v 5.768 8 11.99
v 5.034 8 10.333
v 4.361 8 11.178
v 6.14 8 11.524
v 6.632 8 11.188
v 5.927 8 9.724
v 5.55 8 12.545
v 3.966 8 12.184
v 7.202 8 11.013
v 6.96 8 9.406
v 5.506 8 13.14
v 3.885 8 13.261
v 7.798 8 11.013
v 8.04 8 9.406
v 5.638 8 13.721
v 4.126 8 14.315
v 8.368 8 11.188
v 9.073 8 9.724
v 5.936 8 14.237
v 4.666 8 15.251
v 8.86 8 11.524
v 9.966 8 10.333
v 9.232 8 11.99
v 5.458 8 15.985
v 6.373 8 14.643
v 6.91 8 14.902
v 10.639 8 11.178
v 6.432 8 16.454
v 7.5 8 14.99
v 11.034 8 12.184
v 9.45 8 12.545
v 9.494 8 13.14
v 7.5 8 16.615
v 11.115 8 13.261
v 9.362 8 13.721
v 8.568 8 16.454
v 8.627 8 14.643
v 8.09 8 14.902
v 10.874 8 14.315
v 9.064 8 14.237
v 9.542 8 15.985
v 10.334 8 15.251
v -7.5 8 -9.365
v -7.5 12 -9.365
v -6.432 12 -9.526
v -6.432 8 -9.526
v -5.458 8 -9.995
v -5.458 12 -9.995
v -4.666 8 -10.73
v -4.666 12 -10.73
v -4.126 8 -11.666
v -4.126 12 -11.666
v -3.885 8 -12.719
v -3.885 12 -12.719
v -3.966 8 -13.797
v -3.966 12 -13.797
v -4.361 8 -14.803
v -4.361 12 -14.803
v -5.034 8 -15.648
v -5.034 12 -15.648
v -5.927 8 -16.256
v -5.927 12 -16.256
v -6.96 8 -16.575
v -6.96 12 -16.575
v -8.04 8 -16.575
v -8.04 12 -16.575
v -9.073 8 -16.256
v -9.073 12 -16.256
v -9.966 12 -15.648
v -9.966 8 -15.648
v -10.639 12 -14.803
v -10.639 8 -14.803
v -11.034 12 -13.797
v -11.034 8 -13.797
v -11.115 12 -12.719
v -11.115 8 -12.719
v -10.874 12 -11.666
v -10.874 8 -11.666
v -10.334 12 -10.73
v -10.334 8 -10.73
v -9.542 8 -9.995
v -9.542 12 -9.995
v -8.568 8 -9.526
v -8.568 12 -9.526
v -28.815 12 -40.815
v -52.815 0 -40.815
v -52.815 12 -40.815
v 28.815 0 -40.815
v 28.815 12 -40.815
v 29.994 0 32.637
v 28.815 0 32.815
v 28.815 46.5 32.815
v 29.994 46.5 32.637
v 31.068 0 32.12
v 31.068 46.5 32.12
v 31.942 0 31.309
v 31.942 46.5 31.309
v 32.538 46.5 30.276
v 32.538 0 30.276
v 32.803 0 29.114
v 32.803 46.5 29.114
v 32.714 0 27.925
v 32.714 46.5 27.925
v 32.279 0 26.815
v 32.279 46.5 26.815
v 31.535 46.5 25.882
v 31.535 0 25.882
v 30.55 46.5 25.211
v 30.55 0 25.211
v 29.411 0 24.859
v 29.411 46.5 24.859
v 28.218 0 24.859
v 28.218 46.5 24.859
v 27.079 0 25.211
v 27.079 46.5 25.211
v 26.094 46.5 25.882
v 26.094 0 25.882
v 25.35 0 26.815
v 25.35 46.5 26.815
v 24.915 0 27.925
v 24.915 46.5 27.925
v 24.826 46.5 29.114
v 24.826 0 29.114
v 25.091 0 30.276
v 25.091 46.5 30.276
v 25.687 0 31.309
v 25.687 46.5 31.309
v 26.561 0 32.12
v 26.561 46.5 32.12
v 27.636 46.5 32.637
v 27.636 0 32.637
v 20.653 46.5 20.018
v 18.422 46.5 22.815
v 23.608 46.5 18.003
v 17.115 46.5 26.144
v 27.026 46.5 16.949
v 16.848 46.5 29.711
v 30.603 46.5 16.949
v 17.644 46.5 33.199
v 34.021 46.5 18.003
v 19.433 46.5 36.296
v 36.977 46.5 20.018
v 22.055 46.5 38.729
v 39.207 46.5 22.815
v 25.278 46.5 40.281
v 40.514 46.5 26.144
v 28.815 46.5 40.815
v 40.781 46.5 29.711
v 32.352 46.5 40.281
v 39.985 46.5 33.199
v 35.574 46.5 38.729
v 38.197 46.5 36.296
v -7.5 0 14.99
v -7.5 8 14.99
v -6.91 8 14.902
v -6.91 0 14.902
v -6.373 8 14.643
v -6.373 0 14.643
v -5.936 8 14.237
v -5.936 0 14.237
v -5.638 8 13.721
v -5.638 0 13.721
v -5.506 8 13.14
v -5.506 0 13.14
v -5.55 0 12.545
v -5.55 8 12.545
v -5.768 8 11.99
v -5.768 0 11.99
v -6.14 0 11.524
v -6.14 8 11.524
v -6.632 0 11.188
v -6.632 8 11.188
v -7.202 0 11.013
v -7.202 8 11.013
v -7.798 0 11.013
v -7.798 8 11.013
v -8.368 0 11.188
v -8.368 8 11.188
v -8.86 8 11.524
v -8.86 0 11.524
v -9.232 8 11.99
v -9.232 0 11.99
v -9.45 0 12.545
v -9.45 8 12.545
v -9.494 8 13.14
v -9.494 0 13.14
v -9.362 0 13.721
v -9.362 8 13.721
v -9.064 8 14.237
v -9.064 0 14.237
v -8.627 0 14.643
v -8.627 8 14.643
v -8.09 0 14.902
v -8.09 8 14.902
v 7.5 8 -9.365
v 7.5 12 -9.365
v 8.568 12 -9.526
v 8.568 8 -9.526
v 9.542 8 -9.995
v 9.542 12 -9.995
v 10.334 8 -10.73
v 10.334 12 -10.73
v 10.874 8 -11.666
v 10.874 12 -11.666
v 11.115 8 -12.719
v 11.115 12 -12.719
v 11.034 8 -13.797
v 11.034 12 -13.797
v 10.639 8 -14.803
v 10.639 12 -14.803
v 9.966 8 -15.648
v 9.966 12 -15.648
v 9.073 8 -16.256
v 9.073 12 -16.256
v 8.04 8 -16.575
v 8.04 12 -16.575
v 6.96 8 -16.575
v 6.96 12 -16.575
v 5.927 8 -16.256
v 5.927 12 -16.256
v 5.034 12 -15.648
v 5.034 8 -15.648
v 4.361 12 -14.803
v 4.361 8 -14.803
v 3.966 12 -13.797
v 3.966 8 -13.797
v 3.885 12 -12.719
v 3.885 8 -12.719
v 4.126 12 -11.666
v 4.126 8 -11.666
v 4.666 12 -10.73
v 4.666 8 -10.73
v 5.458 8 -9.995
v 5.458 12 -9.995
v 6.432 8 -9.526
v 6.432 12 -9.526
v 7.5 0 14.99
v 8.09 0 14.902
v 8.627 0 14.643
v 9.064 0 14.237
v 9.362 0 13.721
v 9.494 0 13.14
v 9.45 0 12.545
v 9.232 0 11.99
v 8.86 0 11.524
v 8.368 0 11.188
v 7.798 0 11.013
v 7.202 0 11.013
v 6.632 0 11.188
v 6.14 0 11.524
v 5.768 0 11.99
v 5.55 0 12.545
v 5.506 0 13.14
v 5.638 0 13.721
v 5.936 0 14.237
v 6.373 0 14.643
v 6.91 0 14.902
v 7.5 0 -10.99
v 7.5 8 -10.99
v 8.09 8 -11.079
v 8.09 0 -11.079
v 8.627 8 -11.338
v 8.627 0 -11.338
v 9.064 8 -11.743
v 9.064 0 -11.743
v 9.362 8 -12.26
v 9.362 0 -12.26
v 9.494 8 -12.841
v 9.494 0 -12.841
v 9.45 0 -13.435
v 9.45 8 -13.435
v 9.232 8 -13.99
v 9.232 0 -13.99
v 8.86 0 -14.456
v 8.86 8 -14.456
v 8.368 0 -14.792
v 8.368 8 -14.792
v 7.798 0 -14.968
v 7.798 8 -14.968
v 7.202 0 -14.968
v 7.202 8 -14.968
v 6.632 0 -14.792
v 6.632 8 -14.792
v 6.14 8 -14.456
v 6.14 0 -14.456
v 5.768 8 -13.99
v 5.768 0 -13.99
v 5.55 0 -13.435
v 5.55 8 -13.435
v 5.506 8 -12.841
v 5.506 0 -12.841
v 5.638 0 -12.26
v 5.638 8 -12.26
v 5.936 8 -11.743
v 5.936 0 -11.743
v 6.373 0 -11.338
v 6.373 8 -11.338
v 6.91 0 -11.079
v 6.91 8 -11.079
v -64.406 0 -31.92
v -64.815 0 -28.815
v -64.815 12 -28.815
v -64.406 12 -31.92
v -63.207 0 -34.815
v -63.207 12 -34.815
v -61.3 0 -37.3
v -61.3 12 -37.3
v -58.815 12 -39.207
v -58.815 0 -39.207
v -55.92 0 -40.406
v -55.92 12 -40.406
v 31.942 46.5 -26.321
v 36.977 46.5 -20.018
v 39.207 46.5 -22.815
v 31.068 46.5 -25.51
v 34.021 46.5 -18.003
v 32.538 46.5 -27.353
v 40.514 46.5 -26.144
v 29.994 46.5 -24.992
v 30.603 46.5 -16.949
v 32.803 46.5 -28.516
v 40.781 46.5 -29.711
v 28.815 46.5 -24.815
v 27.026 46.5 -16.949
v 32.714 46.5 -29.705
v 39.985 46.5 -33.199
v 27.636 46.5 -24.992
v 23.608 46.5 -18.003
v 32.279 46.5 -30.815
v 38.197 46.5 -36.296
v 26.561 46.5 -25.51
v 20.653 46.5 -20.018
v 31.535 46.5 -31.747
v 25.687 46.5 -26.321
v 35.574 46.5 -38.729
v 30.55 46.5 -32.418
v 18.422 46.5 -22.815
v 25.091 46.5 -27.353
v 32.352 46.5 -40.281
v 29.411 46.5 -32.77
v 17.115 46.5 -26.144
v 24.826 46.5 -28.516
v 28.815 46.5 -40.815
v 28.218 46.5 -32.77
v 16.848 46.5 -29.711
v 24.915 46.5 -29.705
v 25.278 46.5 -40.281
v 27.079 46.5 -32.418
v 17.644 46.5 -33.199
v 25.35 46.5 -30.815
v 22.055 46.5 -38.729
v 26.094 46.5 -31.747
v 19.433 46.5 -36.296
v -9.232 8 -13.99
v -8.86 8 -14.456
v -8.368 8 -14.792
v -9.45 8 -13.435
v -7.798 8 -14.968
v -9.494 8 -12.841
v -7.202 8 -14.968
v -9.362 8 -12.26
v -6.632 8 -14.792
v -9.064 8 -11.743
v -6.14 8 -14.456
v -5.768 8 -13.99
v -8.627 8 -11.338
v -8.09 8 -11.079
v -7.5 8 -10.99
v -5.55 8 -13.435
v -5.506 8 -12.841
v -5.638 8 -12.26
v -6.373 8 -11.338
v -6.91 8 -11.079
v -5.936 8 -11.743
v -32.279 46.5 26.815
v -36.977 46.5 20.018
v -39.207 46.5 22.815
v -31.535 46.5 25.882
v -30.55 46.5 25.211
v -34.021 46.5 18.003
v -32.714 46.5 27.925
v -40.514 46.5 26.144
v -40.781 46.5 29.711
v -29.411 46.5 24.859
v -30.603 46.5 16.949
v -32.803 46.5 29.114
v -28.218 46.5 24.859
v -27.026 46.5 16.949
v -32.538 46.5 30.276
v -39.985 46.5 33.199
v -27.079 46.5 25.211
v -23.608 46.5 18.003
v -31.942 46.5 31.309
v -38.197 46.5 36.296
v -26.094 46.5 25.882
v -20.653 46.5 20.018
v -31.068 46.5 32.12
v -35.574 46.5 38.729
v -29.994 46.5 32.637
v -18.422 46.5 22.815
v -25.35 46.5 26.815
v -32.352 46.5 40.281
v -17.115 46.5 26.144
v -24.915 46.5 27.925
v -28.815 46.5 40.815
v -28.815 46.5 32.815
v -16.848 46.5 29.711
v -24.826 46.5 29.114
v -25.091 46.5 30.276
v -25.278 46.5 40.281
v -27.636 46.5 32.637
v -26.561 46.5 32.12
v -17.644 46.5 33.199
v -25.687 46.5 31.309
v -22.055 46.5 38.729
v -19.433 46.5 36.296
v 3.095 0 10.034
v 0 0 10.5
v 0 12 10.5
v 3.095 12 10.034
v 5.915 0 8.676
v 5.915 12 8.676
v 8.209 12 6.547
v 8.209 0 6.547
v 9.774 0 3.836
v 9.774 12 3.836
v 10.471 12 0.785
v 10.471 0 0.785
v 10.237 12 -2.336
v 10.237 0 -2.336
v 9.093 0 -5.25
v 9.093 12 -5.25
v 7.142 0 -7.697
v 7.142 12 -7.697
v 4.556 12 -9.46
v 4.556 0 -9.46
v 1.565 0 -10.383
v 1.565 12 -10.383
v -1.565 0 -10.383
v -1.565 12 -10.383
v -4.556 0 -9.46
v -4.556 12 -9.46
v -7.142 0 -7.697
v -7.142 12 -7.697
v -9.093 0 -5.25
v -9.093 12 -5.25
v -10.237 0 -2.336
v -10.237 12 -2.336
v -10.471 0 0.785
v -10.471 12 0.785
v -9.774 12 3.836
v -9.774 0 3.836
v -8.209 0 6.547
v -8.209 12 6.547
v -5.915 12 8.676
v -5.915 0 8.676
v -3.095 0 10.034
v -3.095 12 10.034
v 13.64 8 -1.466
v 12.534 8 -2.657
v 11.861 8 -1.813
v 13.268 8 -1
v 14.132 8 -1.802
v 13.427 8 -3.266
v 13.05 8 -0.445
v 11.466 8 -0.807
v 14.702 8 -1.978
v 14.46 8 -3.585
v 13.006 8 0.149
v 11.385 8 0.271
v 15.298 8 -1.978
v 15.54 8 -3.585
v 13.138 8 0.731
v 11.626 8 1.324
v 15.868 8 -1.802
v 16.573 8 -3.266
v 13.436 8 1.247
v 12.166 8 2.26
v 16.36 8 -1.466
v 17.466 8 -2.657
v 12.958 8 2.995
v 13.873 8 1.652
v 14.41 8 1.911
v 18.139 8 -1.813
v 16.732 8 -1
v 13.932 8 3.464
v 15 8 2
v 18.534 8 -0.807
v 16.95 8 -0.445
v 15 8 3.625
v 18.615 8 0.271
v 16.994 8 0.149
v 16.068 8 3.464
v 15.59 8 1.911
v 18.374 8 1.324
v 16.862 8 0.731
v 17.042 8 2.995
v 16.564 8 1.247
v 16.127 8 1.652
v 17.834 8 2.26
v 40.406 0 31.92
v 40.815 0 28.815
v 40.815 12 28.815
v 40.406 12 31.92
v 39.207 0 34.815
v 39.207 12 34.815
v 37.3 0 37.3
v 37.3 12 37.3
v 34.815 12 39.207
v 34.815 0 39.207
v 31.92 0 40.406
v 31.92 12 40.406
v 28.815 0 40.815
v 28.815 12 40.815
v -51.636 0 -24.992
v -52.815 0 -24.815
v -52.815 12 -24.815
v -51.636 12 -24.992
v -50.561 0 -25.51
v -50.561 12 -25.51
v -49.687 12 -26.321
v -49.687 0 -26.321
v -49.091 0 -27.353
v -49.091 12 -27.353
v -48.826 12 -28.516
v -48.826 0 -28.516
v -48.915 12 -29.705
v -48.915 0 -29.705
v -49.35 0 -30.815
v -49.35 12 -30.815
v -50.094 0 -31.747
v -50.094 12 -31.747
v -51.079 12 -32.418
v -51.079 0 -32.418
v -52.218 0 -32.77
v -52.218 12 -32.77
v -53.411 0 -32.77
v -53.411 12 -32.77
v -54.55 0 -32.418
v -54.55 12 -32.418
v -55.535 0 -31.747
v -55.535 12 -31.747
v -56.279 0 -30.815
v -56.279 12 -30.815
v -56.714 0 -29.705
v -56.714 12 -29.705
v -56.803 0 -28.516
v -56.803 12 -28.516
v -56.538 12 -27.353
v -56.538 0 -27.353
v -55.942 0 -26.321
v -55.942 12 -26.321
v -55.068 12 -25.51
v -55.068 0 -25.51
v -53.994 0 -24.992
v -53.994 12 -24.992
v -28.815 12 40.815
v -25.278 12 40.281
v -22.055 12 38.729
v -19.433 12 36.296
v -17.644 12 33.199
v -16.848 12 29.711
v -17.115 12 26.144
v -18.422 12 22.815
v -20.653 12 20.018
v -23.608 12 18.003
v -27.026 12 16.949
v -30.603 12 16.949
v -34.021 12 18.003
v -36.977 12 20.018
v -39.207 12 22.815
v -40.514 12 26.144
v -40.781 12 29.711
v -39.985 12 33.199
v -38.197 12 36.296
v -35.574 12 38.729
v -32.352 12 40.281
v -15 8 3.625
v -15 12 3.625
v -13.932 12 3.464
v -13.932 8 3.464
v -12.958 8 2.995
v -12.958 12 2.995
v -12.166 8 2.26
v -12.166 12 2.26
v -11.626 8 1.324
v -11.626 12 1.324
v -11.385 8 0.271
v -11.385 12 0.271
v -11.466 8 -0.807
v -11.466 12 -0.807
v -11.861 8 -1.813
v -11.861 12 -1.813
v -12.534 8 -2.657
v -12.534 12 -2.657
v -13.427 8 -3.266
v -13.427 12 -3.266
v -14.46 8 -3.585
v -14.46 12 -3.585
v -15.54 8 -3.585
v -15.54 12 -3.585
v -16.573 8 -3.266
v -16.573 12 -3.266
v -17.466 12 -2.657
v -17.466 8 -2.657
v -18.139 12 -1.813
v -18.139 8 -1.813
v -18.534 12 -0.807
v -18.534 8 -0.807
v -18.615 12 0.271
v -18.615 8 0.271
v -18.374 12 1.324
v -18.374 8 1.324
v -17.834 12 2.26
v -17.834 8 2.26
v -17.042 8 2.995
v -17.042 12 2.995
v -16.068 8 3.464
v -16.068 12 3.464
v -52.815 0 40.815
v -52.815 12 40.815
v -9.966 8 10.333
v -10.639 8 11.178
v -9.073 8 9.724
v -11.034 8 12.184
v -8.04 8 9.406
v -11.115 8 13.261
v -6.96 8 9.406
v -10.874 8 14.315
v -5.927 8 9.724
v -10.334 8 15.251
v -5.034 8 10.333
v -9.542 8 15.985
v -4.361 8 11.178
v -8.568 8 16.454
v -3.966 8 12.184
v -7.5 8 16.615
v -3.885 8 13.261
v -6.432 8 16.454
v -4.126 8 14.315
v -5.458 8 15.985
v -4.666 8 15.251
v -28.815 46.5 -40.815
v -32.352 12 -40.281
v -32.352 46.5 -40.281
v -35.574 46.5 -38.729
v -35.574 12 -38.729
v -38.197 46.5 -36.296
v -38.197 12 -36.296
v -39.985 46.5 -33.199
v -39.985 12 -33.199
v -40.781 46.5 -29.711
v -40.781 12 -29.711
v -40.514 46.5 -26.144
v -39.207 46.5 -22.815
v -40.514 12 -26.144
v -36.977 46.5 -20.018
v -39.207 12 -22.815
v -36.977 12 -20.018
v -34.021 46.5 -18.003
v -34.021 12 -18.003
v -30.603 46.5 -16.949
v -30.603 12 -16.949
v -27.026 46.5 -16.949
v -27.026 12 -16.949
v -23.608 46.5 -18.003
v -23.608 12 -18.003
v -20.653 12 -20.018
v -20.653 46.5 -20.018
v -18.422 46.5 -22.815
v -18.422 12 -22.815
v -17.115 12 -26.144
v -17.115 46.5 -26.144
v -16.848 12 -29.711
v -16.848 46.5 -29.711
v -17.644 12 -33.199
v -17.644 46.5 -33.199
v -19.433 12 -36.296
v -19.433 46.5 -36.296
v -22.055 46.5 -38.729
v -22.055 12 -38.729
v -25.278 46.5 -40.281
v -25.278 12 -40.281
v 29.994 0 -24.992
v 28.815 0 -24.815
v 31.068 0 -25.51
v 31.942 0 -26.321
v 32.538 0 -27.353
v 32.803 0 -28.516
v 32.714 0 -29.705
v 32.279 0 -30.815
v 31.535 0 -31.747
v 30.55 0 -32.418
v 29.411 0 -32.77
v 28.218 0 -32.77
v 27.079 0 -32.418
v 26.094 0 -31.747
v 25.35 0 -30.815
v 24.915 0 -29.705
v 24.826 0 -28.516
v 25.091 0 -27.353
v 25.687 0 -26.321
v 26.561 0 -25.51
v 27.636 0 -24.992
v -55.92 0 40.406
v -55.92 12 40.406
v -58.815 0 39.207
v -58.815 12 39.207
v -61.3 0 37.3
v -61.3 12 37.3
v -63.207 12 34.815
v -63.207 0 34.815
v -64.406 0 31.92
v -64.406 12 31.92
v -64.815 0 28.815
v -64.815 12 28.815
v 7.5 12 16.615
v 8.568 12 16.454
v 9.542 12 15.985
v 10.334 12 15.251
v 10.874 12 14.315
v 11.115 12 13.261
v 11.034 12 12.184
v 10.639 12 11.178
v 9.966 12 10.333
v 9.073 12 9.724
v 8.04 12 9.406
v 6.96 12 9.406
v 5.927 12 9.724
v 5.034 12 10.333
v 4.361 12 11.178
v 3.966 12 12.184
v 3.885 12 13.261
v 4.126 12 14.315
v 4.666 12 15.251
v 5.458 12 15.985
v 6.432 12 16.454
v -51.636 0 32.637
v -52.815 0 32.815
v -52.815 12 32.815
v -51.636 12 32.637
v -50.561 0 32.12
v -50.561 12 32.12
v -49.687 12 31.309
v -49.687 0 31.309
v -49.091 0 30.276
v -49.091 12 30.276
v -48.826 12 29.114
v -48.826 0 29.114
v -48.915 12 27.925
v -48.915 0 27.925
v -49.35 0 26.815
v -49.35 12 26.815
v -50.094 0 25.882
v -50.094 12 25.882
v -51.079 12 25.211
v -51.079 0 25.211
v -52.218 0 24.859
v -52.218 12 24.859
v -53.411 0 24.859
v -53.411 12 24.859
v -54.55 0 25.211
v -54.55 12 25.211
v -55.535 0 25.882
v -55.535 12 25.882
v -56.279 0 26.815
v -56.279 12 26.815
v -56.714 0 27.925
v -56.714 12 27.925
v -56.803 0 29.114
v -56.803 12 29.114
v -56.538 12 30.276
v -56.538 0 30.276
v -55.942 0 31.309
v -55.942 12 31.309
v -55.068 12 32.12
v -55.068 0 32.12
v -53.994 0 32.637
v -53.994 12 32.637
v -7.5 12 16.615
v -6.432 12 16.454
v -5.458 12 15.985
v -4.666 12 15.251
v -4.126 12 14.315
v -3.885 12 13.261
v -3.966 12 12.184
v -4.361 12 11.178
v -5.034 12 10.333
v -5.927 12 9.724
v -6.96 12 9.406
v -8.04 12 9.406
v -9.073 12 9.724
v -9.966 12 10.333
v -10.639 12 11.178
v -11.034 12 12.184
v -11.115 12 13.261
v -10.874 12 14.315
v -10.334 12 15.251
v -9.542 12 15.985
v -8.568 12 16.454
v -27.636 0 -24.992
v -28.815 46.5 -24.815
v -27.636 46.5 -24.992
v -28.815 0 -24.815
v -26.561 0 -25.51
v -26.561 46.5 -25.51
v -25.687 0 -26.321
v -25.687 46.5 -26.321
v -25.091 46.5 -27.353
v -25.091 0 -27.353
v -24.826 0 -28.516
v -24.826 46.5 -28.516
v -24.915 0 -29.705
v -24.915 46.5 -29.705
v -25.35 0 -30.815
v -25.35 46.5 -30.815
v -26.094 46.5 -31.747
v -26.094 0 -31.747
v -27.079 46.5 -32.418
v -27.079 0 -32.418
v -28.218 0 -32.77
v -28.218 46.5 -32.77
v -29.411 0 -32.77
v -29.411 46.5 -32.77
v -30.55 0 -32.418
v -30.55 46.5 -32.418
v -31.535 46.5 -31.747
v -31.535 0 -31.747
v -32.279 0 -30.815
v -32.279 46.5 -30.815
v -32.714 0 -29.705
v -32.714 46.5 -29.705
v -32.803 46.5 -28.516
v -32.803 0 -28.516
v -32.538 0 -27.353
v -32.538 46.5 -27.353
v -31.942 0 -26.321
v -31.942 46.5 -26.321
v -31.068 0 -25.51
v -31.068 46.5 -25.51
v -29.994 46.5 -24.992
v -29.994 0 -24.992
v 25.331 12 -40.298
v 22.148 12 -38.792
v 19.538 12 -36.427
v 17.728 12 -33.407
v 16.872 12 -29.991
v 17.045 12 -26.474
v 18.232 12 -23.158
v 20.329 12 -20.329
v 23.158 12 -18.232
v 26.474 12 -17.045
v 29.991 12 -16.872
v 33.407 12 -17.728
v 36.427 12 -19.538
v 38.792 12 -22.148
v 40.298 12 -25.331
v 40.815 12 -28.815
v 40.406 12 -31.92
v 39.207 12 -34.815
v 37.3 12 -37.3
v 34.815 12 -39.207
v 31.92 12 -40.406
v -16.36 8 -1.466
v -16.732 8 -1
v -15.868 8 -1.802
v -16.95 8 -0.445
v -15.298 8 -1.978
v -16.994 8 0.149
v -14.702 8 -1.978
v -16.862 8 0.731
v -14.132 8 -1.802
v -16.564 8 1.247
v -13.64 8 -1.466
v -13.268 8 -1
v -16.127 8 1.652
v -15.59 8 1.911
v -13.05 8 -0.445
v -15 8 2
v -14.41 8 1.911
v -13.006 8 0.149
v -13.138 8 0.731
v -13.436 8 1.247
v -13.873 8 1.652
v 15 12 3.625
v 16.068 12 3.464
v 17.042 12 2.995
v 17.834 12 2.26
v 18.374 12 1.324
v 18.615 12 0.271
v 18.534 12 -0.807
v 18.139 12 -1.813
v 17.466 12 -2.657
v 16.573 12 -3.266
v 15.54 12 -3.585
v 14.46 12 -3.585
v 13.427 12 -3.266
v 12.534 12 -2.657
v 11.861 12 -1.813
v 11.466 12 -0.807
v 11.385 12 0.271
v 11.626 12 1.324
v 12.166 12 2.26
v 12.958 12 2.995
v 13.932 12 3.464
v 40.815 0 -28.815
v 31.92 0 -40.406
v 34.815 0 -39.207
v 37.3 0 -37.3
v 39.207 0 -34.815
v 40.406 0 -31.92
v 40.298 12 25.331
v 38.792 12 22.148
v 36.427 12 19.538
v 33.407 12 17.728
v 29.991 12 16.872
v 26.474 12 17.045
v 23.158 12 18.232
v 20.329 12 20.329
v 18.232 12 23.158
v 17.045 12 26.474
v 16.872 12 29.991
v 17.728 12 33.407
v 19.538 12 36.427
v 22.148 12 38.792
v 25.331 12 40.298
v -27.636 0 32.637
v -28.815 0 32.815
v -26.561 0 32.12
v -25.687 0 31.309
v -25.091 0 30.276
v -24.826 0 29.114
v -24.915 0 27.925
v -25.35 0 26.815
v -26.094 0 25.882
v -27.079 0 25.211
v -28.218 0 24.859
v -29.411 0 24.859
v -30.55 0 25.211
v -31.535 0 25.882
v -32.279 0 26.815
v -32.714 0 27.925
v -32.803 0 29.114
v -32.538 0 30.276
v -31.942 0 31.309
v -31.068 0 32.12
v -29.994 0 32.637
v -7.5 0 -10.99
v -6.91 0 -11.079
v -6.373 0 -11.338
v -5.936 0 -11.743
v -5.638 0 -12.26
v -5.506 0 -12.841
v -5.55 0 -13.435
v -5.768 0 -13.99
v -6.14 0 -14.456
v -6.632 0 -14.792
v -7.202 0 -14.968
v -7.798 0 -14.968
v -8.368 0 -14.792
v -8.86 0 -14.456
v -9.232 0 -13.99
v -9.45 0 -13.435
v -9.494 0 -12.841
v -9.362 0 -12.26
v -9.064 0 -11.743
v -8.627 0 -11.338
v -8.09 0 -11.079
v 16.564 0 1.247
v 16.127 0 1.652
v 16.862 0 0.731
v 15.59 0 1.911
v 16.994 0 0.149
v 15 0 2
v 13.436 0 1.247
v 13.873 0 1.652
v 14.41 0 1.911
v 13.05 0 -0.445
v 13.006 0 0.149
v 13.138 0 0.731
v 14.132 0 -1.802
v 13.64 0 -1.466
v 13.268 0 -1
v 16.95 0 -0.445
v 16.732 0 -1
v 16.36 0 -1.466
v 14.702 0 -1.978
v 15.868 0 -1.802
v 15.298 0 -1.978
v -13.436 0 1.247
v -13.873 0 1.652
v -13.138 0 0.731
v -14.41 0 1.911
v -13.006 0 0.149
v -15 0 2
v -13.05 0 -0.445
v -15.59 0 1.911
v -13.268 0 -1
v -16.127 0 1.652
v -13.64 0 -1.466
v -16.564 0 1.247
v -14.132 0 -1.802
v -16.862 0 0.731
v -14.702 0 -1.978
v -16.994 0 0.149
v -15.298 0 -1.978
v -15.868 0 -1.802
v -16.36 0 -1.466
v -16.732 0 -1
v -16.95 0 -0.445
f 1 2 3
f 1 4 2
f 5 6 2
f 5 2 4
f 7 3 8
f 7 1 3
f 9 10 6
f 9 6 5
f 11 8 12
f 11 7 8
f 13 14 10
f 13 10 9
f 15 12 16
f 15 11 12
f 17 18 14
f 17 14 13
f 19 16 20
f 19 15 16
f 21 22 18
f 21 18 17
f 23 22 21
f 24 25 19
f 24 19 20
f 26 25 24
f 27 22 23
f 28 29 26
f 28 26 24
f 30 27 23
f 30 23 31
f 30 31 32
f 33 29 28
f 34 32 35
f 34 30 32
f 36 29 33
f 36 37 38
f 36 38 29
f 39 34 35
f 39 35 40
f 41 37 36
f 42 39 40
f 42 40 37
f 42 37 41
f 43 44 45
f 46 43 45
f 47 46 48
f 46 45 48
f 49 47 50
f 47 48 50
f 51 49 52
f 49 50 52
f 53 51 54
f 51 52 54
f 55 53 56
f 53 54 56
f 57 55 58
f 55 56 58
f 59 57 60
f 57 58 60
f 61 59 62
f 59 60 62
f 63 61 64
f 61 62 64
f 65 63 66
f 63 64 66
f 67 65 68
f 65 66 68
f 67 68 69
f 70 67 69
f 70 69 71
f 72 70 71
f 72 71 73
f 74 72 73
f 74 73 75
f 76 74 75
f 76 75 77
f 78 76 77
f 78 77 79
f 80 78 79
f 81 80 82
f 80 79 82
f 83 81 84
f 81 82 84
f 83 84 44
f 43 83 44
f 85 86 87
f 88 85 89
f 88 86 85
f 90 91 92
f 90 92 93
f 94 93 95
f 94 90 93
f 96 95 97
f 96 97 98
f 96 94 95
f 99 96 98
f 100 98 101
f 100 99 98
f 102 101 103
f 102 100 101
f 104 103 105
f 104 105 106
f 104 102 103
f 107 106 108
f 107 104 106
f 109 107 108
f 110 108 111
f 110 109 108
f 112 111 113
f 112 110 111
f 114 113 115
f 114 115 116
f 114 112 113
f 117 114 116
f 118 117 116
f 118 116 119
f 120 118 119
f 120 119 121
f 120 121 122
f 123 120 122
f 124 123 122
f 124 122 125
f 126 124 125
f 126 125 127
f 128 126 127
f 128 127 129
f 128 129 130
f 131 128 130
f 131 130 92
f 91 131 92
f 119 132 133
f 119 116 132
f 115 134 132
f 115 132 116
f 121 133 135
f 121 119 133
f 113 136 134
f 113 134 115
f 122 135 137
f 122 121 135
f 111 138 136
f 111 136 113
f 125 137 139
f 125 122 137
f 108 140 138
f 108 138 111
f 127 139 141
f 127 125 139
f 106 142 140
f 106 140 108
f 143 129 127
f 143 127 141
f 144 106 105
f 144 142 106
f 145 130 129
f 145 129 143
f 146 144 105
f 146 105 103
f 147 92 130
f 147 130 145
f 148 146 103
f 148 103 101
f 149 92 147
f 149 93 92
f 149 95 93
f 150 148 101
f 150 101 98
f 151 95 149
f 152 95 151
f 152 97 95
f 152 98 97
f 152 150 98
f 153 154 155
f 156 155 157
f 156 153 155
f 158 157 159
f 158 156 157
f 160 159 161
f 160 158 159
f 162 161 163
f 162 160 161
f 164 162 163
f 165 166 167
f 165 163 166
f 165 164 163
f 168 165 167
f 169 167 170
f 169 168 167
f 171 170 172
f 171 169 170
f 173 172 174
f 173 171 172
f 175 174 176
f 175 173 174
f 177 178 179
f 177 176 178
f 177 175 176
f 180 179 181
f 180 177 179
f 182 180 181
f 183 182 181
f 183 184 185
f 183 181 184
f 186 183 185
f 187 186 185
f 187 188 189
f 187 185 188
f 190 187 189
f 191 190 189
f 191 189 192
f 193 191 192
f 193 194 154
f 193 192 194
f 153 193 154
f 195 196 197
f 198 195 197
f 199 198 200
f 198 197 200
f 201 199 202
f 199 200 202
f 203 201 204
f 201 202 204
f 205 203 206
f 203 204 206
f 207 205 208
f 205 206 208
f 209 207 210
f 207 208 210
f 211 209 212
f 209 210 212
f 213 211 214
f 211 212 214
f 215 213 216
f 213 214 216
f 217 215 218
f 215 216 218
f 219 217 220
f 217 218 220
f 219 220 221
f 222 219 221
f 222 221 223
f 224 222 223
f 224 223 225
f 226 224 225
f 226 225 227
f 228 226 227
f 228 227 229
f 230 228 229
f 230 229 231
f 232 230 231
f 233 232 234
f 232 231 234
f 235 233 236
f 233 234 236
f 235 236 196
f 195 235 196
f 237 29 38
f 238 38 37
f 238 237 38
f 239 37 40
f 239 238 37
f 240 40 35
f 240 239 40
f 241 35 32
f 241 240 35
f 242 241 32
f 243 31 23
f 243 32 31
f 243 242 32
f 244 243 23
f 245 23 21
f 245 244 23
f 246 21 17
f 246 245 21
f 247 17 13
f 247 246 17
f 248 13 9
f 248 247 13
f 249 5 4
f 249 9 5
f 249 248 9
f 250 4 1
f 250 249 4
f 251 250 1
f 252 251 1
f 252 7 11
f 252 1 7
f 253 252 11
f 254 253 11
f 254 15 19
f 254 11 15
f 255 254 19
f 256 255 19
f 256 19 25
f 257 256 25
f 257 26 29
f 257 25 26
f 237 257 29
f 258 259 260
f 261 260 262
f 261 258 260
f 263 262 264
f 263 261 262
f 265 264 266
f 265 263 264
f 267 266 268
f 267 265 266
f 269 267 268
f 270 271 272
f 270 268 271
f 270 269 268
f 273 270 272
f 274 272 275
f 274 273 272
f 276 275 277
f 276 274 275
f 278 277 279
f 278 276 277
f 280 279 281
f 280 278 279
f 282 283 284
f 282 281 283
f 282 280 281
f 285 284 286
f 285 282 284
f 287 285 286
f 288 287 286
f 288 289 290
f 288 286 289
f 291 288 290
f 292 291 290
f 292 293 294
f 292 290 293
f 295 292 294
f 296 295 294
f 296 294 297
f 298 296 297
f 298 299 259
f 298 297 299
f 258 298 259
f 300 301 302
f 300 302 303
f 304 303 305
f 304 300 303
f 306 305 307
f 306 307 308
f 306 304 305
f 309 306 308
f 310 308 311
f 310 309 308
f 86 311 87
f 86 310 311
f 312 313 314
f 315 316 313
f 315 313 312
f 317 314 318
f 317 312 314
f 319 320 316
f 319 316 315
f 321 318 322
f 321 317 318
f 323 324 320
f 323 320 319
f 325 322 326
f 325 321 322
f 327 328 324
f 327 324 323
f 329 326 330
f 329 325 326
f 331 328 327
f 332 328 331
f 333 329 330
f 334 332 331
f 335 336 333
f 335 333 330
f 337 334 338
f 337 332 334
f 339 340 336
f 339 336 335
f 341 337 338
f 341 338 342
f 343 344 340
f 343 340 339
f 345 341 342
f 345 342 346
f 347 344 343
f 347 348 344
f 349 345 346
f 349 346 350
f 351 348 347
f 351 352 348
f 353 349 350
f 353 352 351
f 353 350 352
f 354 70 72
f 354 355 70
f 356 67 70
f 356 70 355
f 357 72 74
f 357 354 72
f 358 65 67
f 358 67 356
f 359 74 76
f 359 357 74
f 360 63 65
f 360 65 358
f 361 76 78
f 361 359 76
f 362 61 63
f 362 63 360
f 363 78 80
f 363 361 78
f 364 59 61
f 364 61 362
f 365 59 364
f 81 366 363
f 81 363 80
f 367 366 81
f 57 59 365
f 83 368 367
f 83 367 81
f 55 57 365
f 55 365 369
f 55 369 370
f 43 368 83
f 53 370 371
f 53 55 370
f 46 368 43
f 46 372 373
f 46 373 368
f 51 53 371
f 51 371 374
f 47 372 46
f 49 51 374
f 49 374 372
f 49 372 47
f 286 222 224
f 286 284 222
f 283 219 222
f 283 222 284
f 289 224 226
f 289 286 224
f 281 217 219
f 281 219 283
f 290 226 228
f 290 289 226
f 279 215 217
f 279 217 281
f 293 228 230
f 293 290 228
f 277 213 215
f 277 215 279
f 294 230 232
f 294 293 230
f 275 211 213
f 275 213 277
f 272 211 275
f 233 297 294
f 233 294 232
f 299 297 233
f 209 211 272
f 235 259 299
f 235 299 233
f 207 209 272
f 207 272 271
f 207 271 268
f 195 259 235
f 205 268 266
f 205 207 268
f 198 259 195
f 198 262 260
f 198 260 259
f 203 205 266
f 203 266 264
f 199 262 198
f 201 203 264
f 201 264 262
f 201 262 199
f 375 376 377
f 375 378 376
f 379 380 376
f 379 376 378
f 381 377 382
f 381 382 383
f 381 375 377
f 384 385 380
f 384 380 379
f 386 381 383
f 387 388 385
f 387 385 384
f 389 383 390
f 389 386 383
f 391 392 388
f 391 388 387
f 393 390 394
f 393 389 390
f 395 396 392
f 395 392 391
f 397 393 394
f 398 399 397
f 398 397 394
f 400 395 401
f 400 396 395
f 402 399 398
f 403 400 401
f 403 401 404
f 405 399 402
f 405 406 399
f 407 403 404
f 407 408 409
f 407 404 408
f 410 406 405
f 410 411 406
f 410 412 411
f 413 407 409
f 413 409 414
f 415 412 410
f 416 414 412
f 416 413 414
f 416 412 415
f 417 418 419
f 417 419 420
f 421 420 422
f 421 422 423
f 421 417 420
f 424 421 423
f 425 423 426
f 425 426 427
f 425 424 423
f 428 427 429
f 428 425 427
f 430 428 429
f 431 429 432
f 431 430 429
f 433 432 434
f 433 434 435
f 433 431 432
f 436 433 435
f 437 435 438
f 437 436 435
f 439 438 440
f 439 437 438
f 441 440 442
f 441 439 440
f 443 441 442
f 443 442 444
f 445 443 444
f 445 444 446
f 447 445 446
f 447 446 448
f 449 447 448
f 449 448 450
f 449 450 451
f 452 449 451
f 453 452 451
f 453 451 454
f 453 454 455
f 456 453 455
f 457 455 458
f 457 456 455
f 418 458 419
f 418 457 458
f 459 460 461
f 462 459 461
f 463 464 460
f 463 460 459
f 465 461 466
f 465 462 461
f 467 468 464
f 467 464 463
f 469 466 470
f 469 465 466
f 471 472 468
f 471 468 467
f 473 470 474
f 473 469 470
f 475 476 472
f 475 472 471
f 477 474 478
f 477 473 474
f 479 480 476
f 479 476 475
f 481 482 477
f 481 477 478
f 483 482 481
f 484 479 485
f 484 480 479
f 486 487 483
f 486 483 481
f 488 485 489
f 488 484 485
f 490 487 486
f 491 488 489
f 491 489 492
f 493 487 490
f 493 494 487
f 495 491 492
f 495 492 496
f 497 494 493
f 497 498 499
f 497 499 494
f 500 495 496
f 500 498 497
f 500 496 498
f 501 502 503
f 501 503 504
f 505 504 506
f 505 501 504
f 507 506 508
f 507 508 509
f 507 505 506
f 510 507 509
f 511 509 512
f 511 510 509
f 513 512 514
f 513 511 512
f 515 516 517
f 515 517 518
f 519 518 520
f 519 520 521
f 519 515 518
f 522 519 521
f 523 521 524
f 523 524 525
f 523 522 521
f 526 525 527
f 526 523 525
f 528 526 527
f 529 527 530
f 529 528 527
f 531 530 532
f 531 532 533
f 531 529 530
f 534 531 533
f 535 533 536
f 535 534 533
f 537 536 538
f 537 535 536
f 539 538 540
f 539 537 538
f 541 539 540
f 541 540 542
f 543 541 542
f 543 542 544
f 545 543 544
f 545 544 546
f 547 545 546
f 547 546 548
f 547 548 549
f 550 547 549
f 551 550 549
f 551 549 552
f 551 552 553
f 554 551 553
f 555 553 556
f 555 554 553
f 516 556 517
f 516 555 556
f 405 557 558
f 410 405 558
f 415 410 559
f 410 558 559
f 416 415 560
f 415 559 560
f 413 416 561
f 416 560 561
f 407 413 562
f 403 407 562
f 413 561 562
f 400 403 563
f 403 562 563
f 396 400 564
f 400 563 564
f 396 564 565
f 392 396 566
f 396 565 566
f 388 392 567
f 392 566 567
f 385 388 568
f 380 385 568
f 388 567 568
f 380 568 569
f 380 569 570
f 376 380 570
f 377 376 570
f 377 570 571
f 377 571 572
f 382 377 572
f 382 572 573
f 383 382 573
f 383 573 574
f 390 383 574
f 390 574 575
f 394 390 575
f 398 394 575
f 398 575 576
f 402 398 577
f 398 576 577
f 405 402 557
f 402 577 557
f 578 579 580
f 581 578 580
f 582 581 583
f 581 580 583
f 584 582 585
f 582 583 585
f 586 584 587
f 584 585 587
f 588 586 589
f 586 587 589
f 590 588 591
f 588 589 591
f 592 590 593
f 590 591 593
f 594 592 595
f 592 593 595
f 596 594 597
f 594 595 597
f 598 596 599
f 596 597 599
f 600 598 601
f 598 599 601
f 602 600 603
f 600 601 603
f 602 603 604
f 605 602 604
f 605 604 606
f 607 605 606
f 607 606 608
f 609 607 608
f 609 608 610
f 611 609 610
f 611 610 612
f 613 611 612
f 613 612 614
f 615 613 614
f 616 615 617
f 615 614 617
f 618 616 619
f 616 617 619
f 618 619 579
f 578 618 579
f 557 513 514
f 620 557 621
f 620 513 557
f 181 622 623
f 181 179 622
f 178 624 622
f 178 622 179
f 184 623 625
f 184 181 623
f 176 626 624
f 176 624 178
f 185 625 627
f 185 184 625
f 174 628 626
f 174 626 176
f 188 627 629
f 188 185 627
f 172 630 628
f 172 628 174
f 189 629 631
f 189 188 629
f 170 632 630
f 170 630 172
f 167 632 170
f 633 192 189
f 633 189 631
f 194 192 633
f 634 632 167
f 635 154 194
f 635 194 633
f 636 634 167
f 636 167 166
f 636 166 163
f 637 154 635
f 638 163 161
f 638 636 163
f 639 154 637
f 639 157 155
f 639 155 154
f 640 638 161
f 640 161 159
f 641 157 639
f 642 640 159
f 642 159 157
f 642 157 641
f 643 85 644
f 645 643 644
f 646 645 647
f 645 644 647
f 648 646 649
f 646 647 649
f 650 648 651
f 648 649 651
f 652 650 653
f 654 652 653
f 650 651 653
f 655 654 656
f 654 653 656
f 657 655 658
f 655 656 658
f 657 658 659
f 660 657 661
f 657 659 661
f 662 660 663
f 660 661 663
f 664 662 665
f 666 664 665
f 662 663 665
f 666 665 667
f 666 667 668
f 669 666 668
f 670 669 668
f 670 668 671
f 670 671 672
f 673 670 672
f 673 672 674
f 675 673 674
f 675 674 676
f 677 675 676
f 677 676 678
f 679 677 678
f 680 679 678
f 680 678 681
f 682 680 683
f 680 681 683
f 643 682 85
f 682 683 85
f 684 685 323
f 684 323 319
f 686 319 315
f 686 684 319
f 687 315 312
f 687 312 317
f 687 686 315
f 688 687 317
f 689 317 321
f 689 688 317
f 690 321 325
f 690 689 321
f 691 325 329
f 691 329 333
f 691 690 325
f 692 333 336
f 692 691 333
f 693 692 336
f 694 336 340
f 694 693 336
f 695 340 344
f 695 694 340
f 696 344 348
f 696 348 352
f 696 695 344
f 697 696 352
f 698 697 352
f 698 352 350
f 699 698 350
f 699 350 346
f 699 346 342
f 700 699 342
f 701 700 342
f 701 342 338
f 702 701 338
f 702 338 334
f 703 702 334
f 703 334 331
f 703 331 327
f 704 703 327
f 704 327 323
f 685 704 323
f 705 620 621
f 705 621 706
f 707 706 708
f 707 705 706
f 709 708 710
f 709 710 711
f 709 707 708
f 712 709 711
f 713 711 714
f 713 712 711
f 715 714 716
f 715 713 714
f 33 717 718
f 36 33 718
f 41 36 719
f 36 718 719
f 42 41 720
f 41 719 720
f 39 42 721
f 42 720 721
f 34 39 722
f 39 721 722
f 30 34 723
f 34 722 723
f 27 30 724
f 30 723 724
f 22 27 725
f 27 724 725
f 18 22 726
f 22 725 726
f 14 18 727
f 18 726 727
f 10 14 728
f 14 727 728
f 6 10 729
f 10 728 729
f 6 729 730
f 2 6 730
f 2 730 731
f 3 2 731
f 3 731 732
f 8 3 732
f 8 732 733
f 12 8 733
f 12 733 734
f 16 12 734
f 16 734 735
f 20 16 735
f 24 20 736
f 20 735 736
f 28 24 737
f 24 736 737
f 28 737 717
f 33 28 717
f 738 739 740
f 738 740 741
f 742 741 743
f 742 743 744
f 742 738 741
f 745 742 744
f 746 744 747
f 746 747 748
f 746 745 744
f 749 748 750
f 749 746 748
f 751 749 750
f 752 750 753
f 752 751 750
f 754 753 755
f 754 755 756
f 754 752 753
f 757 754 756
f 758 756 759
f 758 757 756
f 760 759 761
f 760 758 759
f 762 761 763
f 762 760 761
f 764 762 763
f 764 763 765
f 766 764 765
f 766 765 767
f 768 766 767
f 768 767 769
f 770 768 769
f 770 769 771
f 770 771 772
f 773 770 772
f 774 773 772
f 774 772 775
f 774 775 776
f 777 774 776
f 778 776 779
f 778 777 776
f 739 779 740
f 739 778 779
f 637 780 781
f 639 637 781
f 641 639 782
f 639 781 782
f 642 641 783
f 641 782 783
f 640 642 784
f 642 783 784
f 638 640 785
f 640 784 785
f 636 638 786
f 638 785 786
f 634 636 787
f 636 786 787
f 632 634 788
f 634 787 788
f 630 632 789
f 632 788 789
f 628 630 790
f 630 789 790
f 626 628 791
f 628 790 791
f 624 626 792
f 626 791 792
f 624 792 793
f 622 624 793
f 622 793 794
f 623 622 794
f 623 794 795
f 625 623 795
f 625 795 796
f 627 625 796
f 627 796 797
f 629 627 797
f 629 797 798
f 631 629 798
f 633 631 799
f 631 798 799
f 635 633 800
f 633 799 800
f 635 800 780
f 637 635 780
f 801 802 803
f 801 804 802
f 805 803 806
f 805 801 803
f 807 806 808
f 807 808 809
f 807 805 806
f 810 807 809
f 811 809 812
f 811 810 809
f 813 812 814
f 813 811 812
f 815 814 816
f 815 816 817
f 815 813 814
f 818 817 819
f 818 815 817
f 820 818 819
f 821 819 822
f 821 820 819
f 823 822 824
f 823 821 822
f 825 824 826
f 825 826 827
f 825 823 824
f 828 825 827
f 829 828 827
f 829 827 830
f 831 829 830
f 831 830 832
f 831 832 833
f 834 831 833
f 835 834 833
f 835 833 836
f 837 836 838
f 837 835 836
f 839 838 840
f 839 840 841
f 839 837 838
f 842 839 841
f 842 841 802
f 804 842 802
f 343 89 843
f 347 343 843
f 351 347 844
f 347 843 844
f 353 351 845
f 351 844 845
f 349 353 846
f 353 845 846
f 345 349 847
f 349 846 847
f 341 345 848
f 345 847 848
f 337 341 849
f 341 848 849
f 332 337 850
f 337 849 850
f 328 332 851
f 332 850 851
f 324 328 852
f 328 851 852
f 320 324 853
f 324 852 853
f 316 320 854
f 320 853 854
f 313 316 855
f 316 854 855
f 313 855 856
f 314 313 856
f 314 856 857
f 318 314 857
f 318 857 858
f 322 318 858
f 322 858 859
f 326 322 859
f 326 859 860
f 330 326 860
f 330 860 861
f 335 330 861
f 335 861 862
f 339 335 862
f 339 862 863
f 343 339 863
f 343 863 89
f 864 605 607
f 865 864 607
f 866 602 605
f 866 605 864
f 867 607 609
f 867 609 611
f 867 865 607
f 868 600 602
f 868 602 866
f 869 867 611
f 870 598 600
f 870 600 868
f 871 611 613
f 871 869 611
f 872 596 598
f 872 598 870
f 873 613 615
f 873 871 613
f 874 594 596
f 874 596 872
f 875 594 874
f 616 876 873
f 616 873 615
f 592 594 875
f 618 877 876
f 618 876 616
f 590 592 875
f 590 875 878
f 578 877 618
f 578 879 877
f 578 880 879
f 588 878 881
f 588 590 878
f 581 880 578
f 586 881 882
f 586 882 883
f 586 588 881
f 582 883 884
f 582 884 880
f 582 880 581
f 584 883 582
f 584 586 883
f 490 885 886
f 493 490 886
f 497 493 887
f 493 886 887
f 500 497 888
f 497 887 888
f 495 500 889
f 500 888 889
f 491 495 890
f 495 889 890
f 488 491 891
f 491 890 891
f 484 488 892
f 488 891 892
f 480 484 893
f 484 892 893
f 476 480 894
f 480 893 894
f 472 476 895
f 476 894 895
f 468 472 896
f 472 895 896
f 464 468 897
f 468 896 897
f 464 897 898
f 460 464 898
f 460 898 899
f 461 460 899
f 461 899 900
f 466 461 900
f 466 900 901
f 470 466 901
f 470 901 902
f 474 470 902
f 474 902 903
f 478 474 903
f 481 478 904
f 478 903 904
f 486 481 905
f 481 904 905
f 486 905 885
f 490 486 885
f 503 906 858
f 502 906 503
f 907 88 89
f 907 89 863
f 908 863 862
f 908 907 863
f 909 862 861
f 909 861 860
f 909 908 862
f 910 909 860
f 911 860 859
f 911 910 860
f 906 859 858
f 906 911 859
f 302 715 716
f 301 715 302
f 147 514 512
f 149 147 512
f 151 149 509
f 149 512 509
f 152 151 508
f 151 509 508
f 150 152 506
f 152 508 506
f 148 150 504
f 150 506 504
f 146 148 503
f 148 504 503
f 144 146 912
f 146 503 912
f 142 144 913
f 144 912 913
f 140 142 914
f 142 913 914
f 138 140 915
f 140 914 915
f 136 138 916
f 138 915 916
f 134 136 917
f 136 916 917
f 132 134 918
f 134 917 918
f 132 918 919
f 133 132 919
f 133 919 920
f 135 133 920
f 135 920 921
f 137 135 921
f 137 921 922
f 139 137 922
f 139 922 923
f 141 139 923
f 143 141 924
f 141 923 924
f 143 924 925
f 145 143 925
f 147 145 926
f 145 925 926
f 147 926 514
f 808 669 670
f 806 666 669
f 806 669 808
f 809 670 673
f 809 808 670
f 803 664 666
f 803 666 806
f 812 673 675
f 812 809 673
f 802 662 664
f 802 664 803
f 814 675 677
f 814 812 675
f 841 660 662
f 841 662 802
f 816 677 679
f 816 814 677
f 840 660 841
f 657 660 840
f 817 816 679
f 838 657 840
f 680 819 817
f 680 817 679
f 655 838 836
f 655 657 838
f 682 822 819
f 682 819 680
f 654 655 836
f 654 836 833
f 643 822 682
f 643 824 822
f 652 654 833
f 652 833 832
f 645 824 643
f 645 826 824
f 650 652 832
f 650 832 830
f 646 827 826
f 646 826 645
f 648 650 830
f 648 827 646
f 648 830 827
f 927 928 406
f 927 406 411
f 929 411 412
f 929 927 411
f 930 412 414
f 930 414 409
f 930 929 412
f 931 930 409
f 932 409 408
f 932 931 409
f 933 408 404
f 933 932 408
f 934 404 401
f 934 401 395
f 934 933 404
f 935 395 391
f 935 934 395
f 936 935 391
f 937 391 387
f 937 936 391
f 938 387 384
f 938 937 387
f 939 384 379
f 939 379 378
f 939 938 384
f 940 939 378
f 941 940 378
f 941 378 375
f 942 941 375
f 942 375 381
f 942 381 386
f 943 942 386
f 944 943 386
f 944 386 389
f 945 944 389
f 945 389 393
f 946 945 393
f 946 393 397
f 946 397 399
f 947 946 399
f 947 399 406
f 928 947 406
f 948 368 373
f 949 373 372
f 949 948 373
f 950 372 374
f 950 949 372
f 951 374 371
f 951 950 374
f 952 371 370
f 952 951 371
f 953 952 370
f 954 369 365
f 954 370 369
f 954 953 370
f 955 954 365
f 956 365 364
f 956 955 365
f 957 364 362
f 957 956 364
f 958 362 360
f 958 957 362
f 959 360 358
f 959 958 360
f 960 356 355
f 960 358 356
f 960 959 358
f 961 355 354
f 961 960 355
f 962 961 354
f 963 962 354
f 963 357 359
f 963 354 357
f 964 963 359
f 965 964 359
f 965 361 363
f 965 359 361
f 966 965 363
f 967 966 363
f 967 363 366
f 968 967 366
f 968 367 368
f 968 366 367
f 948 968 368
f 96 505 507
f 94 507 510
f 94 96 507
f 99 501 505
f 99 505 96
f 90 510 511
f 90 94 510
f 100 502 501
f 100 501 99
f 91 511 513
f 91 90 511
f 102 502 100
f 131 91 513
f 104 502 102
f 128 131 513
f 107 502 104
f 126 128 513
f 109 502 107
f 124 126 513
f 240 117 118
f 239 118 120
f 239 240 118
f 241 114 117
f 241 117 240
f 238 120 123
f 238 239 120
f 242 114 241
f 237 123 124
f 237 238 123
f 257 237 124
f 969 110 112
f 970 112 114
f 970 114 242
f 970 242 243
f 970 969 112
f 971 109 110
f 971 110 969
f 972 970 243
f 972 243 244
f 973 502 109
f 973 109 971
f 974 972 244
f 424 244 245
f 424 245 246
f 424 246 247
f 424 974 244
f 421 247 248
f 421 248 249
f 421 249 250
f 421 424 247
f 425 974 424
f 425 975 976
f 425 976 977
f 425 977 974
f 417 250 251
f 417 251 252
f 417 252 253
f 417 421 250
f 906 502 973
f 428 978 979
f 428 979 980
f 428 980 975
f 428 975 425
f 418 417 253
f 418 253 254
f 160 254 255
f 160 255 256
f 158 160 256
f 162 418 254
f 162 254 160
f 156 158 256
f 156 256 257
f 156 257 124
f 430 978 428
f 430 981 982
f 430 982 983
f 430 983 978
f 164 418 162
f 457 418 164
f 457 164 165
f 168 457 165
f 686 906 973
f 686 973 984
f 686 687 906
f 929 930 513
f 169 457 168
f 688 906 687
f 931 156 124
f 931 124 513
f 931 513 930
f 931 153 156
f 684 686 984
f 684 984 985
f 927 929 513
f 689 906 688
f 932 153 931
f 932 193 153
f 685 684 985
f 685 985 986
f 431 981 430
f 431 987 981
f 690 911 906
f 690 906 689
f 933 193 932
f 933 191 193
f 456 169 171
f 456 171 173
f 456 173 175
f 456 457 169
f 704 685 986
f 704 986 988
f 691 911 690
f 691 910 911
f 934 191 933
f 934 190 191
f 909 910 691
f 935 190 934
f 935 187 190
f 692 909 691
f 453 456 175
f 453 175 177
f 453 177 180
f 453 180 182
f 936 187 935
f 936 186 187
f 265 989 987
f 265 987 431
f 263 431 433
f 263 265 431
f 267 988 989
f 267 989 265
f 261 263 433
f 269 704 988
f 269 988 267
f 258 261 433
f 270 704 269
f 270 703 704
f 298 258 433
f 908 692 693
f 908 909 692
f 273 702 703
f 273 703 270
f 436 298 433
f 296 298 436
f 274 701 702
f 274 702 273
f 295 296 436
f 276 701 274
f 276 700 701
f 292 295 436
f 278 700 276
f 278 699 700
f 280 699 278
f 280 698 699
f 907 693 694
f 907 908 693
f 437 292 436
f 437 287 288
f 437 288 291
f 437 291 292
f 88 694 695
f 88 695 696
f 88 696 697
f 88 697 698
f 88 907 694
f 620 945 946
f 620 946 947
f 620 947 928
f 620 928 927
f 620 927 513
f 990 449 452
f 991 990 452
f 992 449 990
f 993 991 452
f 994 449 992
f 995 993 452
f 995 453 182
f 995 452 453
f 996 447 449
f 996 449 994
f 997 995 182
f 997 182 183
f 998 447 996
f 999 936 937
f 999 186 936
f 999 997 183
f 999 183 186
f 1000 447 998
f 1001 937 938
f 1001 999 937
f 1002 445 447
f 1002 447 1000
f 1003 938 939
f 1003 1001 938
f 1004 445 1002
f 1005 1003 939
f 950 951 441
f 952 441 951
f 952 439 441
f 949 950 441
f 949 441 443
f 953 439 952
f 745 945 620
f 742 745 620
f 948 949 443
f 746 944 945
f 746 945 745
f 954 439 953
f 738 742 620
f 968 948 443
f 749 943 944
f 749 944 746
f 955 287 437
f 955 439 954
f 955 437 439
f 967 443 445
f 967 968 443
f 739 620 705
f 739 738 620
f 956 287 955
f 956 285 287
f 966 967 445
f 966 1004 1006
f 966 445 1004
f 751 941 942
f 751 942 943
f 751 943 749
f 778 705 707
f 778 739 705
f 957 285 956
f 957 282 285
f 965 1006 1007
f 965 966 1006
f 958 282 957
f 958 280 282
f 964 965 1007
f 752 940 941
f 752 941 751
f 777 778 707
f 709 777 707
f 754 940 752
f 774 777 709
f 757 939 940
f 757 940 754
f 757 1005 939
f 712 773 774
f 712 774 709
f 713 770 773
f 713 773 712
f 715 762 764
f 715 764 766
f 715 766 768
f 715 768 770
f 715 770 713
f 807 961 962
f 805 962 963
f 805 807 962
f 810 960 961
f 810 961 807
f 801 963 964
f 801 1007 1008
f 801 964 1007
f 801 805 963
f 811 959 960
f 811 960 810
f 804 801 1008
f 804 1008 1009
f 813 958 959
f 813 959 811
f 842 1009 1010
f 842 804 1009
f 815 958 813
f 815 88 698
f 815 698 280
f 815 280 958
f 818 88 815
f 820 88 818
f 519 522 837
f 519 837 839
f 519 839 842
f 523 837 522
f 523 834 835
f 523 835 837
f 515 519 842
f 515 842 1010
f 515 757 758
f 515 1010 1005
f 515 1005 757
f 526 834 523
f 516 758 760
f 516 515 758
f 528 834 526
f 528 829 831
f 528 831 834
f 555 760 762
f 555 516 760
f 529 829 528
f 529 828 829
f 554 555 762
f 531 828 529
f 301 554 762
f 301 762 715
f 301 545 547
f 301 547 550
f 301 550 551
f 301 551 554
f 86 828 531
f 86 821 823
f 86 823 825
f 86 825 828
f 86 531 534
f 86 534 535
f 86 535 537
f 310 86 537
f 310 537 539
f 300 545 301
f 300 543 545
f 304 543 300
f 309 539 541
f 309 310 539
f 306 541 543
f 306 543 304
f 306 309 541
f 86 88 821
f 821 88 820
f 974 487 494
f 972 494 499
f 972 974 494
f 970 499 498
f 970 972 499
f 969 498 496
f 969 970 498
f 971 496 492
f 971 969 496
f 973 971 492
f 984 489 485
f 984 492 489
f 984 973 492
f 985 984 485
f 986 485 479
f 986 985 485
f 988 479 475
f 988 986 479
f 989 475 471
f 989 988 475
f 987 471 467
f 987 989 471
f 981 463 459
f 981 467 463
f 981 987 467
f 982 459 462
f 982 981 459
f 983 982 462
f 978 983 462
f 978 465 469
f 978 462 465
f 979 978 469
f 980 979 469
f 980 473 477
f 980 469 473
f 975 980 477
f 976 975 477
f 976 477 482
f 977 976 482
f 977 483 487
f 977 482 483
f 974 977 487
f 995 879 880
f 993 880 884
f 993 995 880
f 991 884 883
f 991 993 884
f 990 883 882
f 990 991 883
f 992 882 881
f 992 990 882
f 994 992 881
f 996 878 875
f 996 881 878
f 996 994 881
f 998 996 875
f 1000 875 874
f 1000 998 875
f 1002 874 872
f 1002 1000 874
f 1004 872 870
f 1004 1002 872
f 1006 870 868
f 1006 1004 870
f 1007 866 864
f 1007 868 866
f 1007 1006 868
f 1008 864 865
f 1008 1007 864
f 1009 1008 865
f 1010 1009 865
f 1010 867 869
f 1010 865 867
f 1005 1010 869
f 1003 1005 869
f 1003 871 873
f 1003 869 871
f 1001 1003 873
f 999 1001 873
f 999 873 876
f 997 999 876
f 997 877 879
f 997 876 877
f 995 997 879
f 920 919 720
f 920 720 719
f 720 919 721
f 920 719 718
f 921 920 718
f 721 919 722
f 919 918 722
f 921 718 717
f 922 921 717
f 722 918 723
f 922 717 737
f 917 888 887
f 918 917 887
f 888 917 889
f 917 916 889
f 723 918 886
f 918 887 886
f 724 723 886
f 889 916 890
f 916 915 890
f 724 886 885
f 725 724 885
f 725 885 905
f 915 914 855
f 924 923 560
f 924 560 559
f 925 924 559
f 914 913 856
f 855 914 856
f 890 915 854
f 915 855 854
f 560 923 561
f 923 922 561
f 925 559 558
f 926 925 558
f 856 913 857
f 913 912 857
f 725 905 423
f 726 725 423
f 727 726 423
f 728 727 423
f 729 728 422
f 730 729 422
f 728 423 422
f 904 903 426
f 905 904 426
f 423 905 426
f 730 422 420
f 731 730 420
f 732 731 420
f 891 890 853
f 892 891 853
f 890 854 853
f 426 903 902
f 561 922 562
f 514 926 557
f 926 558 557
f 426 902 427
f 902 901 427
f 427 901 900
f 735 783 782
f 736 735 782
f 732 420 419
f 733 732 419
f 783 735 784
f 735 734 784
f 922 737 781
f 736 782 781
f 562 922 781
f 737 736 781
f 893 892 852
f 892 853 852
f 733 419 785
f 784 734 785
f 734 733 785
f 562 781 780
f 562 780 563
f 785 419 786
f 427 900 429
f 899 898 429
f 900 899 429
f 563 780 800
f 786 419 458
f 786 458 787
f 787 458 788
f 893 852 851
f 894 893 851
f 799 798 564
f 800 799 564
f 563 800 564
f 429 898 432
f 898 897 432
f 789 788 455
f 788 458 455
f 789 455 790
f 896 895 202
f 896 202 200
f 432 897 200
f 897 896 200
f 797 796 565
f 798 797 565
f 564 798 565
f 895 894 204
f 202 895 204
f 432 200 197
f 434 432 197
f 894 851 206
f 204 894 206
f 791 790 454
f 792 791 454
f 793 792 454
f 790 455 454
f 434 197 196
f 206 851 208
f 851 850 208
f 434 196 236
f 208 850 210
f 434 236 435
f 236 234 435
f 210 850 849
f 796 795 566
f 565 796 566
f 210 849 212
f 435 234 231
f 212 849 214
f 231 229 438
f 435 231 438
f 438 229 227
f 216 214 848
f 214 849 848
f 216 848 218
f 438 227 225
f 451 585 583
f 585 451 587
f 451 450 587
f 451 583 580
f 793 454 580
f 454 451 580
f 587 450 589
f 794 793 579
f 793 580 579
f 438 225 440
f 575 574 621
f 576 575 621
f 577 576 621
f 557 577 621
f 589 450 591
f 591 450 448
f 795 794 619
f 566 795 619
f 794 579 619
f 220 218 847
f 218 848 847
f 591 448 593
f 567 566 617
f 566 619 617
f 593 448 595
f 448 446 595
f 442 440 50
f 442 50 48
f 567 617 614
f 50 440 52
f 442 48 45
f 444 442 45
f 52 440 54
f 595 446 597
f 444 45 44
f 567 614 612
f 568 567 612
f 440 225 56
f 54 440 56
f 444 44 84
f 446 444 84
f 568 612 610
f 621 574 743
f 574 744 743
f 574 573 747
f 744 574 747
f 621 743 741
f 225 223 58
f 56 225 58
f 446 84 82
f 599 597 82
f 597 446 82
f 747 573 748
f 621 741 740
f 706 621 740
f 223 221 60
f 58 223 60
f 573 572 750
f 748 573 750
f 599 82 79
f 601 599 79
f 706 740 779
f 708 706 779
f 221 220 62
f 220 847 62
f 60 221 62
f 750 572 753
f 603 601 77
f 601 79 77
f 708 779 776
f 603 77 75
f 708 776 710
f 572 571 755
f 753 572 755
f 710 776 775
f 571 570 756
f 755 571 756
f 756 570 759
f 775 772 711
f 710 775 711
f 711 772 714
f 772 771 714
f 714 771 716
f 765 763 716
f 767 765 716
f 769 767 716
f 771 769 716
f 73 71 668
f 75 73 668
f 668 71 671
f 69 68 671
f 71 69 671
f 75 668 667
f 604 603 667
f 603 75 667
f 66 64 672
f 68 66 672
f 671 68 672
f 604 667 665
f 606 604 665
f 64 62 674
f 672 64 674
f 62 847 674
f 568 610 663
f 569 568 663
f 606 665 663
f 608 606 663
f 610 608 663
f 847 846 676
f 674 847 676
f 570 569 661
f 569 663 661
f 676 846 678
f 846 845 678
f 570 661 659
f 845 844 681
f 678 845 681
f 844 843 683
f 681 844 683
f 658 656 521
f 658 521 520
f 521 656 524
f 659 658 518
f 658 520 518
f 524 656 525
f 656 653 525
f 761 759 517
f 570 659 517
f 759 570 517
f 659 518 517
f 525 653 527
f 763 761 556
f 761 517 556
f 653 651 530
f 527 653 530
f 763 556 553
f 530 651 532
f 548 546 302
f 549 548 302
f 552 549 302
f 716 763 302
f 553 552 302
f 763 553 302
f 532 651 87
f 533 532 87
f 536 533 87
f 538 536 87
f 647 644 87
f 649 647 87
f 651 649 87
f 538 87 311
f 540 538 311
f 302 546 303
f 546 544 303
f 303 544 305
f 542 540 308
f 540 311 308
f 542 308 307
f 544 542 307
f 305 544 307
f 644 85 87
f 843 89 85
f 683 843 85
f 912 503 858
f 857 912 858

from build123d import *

# Parameters (mm, degrees)
SKETCH1_R                = 4
SKETCH1_R_2              = 10.5
SKETCH1_R_3              = 2
BASE_DEPTH               = 12
SKETCH2_R                = 3.625
BOLT_HEAD_RECESSES_DEPTH = 4
SKETCH3_R                = 12
SKETCH3_R_2              = 4
BOSS_EXTRUDE1_DEPTH      = 34.5


with BuildPart() as part:
    # Sketch1 → base (new body)
    with BuildSketch(Plane(origin=(0, 0, 0), x_dir=(1, 0, 0), z_dir=(0, 1, 0))):
        with BuildLine():
            Line((-52.814601333, 40.814601333), (28.814601333, 40.814601333))
            ThreePointArc((28.814601333, 40.814601333), (37.299882708, 37.299882708), (40.814601333, 28.814601333))
            Line((40.814601333, 28.814601333), (40.814601333, -28.814601333))
            ThreePointArc((40.814601333, -28.814601333), (37.299882708, -37.299882708), (28.814601333, -40.814601333))
            Line((28.814601333, -40.814601333), (-52.814601333, -40.814601333))
            ThreePointArc((-52.814601333, -40.814601333), (-61.299882708, -37.299882708), (-64.814601333, -28.814601333))
            Line((-64.814601333, -28.814601333), (-64.814601333, 28.814601333))
            ThreePointArc((-64.814601333, 28.814601333), (-61.299882708, 37.299882708), (-52.814601333, 40.814601333))
        make_face()
        with Locations(Location((-28.814601333, 28.814601333, 0), (0, 0, 270))):
            Circle(SKETCH1_R, mode=Mode.SUBTRACT)
        with Locations(Location((28.814601333, 28.814601333, 0), (0, 0, 270))):
            Circle(SKETCH1_R, mode=Mode.SUBTRACT)
        with Locations(Location((28.814601333, -28.814601333, 0), (0, 0, 270))):
            Circle(SKETCH1_R, mode=Mode.SUBTRACT)
        with Locations(Location((-28.814601333, -28.814601333, 0), (0, 0, 270))):
            Circle(SKETCH1_R, mode=Mode.SUBTRACT)
        with Locations(Location((0, 0, 0), (0, 0, 270))):
            Circle(SKETCH1_R_2, mode=Mode.SUBTRACT)
        with Locations(Location((-7.5, 12.990381057, 0), (0, 0, 270))):
            Circle(SKETCH1_R_3, mode=Mode.SUBTRACT)
        with Locations(Location((7.5, 12.990381057, 0), (0, 0, 270))):
            Circle(SKETCH1_R_3, mode=Mode.SUBTRACT)
        with Locations(Location((15, 0, 0), (0, 0, 270))):
            Circle(SKETCH1_R_3, mode=Mode.SUBTRACT)
        with Locations(Location((7.5, -12.990381057, 0), (0, 0, 270))):
            Circle(SKETCH1_R_3, mode=Mode.SUBTRACT)
        with Locations(Location((-7.5, -12.990381057, 0), (0, 0, 270))):
            Circle(SKETCH1_R_3, mode=Mode.SUBTRACT)
        with Locations(Location((-15, 0, 0), (0, 0, 270))):
            Circle(SKETCH1_R_3, mode=Mode.SUBTRACT)
        with Locations(Location((-52.814601333, 28.814601333, 0), (0, 0, 270))):
            Circle(SKETCH1_R, mode=Mode.SUBTRACT)
        with Locations(Location((-52.814601333, -28.814601333, 0), (0, 0, 270))):
            Circle(SKETCH1_R, mode=Mode.SUBTRACT)
    extrude(amount=BASE_DEPTH)

    # Sketch2 → bolt head recesses (cut)
    with BuildSketch(Plane(origin=(0, 12, 0), x_dir=(1, 0, 0), z_dir=(0, 1, 0))):
        with Locations(Location((-7.5, 12.990381057, 0), (0, 0, 270))):
            Circle(SKETCH2_R)
        with Locations(Location((7.5, 12.990381057, 0), (0, 0, 270))):
            Circle(SKETCH2_R)
        with Locations(Location((15, 0, 0), (0, 0, 270))):
            Circle(SKETCH2_R)
        with Locations(Location((7.5, -12.990381057, 0), (0, 0, 270))):
            Circle(SKETCH2_R)
        with Locations(Location((-7.5, -12.990381057, 0), (0, 0, 270))):
            Circle(SKETCH2_R)
        with Locations(Location((-15, 0, 0), (0, 0, 270))):
            Circle(SKETCH2_R)
    extrude(amount=-BOLT_HEAD_RECESSES_DEPTH, mode=Mode.SUBTRACT)

    # Sketch3 → Boss-Extrude1 (add)
    # profile 1 of 4: a face of its own
    with BuildSketch(Plane(origin=(0, 12, 0), x_dir=(1, 0, 0), z_dir=(0, 1, 0))):
        with Locations(Location((-28.814601333, 28.814601333, 0), (0, 0, 90))):
            Circle(SKETCH3_R)
        with Locations(Location((-28.814601333, 28.814601333, 0), (0, 0, 270))):
            Circle(SKETCH3_R_2, mode=Mode.SUBTRACT)
    # profile 2 of 4: a face of its own
    with BuildSketch(Plane(origin=(0, 12, 0), x_dir=(1, 0, 0), z_dir=(0, 1, 0))):
        with Locations(Location((28.814601333, 28.814601333, 0), (0, 0, 90))):
            Circle(SKETCH3_R)
        with Locations(Location((28.814601333, 28.814601333, 0), (0, 0, 270))):
            Circle(SKETCH3_R_2, mode=Mode.SUBTRACT)
    # profile 3 of 4: a face of its own
    with BuildSketch(Plane(origin=(0, 12, 0), x_dir=(1, 0, 0), z_dir=(0, 1, 0))):
        with Locations(Location((28.814601333, -28.814601333, 0), (0, 0, 270))):
            Circle(SKETCH3_R)
        with Locations(Location((28.814601333, -28.814601333, 0), (0, 0, 270))):
            Circle(SKETCH3_R_2, mode=Mode.SUBTRACT)
    # profile 4 of 4: a face of its own
    with BuildSketch(Plane(origin=(0, 12, 0), x_dir=(1, 0, 0), z_dir=(0, 1, 0))):
        with Locations(Location((-28.814601333, -28.814601333, 0), (0, 0, 270))):
            Circle(SKETCH3_R)
        with Locations(Location((-28.814601333, -28.814601333, 0), (0, 0, 270))):
            Circle(SKETCH3_R_2, mode=Mode.SUBTRACT)
    extrude(amount=BOSS_EXTRUDE1_DEPTH)


solid = part.part
